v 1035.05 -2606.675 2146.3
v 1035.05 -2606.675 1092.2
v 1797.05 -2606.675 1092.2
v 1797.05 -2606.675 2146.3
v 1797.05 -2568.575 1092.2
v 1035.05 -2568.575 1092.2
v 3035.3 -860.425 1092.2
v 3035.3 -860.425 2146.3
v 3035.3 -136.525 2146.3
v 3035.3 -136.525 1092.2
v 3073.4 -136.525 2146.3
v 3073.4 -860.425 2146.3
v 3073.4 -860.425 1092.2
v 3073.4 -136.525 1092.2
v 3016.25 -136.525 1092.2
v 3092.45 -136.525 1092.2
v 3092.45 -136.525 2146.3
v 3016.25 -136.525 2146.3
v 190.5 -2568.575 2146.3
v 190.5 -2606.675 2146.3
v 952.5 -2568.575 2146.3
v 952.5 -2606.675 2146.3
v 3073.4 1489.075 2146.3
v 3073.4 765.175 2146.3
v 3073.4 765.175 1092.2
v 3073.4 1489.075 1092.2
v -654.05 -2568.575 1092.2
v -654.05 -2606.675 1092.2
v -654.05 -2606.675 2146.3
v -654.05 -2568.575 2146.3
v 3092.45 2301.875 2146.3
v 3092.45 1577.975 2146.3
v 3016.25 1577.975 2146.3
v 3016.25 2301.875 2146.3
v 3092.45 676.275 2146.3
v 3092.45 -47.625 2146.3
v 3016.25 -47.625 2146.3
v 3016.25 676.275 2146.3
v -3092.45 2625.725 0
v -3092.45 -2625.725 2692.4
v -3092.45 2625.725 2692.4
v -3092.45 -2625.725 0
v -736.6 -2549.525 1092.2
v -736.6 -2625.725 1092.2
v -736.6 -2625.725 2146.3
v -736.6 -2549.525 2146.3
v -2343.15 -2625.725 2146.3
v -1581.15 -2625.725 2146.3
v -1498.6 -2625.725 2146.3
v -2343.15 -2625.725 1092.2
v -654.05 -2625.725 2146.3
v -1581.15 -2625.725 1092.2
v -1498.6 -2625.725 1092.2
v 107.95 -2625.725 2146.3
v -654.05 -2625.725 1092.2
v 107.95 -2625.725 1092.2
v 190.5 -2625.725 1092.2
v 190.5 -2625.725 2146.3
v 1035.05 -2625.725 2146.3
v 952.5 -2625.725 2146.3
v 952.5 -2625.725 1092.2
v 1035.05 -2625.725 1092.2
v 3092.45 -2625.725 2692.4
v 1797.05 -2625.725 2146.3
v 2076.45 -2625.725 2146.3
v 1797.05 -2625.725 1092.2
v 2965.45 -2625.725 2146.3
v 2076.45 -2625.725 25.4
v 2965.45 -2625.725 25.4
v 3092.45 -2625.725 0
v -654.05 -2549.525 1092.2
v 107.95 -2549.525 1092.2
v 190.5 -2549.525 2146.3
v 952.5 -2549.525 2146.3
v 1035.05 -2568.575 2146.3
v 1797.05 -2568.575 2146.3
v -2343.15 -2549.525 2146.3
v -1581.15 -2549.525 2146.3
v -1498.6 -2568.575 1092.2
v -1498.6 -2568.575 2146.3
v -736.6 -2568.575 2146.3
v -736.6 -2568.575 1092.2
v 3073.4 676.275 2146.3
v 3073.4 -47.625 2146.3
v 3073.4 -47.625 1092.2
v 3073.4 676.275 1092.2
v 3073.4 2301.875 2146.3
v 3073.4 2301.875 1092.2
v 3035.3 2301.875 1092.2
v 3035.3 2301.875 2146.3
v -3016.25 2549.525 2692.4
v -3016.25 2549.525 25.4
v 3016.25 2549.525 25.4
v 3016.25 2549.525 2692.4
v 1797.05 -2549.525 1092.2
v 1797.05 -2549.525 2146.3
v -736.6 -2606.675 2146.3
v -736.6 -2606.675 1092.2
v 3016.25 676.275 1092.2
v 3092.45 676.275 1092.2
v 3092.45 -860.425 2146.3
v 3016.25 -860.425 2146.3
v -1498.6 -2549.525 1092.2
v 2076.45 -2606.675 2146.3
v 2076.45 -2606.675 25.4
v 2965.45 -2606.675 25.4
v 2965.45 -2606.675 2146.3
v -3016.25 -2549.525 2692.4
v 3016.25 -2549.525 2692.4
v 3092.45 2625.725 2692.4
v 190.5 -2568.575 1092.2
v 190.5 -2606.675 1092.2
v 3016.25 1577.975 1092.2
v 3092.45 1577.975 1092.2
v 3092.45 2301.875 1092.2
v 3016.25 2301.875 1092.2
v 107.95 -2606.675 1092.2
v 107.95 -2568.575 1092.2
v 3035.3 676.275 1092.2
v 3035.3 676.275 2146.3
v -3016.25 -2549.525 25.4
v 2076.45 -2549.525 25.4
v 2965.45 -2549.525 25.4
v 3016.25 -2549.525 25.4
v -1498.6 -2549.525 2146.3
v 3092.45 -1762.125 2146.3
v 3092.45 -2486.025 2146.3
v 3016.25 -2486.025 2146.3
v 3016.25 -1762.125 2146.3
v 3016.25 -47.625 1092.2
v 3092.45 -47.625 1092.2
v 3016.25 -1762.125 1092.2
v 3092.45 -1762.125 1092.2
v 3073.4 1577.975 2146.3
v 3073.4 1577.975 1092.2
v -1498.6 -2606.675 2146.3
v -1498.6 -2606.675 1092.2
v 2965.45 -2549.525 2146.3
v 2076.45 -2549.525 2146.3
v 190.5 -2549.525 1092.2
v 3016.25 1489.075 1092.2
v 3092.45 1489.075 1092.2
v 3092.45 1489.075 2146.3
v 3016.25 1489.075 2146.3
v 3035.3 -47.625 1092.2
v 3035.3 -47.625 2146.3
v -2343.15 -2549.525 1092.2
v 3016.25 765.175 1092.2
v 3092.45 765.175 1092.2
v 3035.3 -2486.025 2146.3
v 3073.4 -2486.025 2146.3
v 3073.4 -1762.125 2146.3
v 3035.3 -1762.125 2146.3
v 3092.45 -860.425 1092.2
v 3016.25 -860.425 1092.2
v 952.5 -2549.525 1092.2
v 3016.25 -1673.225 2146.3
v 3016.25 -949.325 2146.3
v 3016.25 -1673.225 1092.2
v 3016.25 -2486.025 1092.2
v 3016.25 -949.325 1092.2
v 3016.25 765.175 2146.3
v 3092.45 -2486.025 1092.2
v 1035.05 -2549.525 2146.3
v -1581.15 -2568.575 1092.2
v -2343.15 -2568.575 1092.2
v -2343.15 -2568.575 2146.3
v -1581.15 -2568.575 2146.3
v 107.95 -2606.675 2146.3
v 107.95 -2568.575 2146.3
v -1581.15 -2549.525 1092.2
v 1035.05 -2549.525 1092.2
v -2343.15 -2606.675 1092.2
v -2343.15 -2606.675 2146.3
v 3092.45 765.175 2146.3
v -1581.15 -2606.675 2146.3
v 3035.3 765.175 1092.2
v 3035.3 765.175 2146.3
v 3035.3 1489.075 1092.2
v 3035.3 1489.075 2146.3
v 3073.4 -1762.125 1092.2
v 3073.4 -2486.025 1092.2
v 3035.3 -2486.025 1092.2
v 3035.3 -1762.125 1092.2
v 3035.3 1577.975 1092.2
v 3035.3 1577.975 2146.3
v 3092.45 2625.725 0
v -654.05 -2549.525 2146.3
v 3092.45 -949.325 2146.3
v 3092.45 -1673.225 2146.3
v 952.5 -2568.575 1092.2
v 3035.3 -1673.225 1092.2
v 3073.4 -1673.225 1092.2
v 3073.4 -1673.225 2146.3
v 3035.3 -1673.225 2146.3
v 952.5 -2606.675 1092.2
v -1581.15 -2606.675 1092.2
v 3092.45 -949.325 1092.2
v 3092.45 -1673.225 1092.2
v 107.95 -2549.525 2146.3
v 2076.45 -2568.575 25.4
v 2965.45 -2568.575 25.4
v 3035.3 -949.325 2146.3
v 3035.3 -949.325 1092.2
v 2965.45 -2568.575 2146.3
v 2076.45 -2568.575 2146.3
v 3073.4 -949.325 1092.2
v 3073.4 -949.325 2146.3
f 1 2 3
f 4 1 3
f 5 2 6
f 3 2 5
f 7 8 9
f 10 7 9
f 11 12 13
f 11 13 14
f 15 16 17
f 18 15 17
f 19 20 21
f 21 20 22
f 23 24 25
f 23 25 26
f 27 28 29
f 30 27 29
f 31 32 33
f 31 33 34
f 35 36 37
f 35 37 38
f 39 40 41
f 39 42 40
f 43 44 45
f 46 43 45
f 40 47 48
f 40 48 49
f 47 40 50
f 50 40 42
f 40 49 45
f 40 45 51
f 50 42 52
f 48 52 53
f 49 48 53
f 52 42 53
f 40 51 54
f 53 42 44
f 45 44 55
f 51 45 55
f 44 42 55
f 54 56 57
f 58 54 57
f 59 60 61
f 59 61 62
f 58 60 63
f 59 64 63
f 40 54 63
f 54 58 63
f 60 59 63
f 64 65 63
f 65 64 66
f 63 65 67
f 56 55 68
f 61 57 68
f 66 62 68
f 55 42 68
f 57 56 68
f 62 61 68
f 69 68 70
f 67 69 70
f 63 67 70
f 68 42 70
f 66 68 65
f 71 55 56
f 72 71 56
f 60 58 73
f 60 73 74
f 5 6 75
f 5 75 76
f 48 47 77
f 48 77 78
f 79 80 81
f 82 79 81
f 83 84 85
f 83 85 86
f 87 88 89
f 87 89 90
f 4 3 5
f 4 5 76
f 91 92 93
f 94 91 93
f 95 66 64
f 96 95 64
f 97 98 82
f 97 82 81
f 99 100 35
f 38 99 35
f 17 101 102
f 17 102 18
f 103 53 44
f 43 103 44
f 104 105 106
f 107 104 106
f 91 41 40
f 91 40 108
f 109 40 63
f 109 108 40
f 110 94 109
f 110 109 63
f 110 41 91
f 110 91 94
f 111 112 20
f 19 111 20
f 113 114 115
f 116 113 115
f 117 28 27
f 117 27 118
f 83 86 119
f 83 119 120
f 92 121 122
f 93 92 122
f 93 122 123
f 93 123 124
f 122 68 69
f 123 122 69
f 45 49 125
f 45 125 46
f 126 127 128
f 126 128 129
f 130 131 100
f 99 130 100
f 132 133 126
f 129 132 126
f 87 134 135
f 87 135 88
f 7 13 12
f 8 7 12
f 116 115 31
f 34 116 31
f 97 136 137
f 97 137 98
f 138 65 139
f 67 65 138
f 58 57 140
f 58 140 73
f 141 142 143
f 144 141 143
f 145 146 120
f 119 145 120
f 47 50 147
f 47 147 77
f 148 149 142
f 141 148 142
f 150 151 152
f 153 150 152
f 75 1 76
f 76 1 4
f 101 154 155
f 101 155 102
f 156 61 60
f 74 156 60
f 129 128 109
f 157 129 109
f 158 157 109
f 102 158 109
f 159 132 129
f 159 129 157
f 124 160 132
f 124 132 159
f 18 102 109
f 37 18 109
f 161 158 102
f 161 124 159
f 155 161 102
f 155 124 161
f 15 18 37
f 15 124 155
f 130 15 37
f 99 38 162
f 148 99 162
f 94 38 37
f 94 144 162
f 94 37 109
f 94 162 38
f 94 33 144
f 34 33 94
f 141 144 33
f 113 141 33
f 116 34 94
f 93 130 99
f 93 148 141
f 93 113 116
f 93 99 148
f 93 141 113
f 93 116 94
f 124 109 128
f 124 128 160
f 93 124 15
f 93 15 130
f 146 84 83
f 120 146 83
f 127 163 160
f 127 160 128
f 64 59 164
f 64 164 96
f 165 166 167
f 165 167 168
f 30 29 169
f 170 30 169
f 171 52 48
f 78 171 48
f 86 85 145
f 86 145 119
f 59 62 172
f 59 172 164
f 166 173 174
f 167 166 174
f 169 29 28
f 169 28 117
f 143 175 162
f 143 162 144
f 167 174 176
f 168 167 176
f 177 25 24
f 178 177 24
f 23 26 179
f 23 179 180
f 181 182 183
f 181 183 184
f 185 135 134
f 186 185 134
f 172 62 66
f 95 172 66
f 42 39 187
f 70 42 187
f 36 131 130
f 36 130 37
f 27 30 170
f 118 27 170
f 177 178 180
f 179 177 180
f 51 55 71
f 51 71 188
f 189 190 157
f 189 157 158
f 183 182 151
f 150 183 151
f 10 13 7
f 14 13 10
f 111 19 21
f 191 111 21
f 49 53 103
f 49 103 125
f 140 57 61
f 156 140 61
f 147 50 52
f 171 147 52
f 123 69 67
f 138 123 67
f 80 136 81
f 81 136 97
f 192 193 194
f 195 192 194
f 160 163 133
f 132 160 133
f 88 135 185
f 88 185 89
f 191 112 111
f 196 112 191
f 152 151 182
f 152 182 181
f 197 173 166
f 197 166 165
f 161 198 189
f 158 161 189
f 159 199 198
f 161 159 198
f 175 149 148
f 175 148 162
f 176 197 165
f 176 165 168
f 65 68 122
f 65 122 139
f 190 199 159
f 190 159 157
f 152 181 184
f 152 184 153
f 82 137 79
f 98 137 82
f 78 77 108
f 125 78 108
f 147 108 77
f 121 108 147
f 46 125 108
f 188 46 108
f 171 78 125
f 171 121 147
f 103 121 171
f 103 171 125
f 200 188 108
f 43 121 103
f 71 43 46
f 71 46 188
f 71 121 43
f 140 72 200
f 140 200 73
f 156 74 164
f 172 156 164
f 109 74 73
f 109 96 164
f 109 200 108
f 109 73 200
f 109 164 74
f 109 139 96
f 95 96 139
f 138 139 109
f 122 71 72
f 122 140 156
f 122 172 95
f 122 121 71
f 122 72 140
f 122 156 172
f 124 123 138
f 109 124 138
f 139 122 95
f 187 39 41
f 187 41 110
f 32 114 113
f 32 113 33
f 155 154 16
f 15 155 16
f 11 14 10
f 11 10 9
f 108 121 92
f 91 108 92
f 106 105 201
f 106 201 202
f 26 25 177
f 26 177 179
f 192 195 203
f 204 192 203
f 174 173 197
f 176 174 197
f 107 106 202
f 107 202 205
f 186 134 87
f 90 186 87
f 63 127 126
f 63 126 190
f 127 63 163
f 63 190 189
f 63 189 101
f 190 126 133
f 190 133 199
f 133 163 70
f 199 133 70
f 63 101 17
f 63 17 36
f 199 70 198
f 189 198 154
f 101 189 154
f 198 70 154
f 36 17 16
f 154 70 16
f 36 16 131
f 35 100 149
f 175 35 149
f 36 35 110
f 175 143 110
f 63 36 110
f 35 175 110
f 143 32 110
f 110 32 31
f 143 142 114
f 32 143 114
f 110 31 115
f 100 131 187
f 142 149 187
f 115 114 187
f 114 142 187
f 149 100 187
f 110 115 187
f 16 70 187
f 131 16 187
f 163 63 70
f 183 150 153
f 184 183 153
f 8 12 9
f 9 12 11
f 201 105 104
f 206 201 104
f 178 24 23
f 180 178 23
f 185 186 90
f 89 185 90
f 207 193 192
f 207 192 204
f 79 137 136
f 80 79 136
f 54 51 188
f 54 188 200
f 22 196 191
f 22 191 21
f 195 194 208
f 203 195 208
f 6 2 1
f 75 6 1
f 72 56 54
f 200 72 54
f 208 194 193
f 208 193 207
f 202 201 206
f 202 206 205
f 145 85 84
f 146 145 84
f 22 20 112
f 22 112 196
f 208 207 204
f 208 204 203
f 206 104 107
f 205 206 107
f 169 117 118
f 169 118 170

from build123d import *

# Parameters (mm, degrees)
F0_W      = 6184.9
F0_H      = 5251.45
F1_DEPTH  = 25.4
F2_W      = 6184.9
F2_H      = 5251.45
F2_W_2    = 6032.5
F2_H_2    = 5099.05
F3_DEPTH  = 2667
F4_W      = 889
F4_H      = 2120.9
F5_DEPTH  = 76.2
F6_W      = 723.9
F6_H      = 1054.1
F7_DEPTH  = 76.2
F8_W      = 762
F8_H      = 1054.1
F9_DEPTH  = 76.2
F10_START = -19.05
F10_DEPTH = 38.1
F11_START = -19.05
F11_DEPTH = 38.1
F12_START = -19.05
F12_DEPTH = 38.1


with BuildPart() as f1:
    # F0 (on Top) → F1 (new body)
    with BuildSketch(Plane.XY):
        Rectangle(F0_W, F0_H)
    extrude(amount=F1_DEPTH)

    # F2 (on face) → F3 (join)
    with BuildSketch(Plane.XY.offset(25.4)):
        Rectangle(F2_W, F2_H)
        Rectangle(F2_W_2, F2_H_2, mode=Mode.SUBTRACT)
    extrude(amount=F3_DEPTH)

    # F4 (on face) → F5 (cut)
    with BuildSketch(Plane.XZ.offset(2625.725)):
        with Locations((2520.95, 1085.85)):
            Rectangle(F4_W, F4_H)
    extrude(amount=-F5_DEPTH, mode=Mode.SUBTRACT)

    # F6 (on face) → F7 (cut)
    with BuildSketch(Plane.YZ.offset(3092.45)):
        with Locations((-2124.075, 1619.25)):
            Rectangle(F6_W, F6_H)
        with Locations((-1311.275, 1619.25)):
            Rectangle(F6_W, F6_H)
        with Locations((-498.475, 1619.25)):
            Rectangle(F6_W, F6_H)
        with Locations((314.325, 1619.25)):
            Rectangle(F6_W, F6_H)
        with Locations((1127.125, 1619.25)):
            Rectangle(F6_W, F6_H)
        with Locations((1939.925, 1619.25)):
            Rectangle(F6_W, F6_H)
    extrude(amount=-F7_DEPTH, mode=Mode.SUBTRACT)

    # F8 (on face) → F9 (cut)
    with BuildSketch(Plane.XZ.offset(2625.725)):
        with Locations((-1962.15, 1619.25)):
            Rectangle(F8_W, F8_H)
        with Locations((-1117.6, 1619.25)):
            Rectangle(F8_W, F8_H)
        with Locations((-273.05, 1619.25)):
            Rectangle(F8_W, F8_H)
        with Locations((571.5, 1619.25)):
            Rectangle(F8_W, F8_H)
        with Locations((1416.05, 1619.25)):
            Rectangle(F8_W, F8_H)
    extrude(amount=-F9_DEPTH, mode=Mode.SUBTRACT)


with BuildPart() as f10:
    # F4 (on face) → F10 (new body)
    with BuildSketch(Plane.XZ.offset(2625.725).offset(F10_START)):
        with Locations((2520.95, 1085.85)):
            Rectangle(F4_W, F4_H)
    extrude(amount=-F10_DEPTH)


with BuildPart() as f11:
    # F6 (on face) → F11 (new body)
    with BuildSketch(Plane.YZ.offset(3092.45).offset(F11_START)):
        with Locations((-2124.075, 1619.25)):
            Rectangle(F6_W, F6_H)
    extrude(amount=-F11_DEPTH)


with BuildPart() as f11b:
    # F6 (on face) → F11, piece 2 (new body)
    with BuildSketch(Plane.YZ.offset(3092.45).offset(F11_START)):
        with Locations((-1311.275, 1619.25)):
            Rectangle(F6_W, F6_H)
    extrude(amount=-F11_DEPTH)


with BuildPart() as f11c:
    # F6 (on face) → F11, piece 3 (new body)
    with BuildSketch(Plane.YZ.offset(3092.45).offset(F11_START)):
        with Locations((-498.475, 1619.25)):
            Rectangle(F6_W, F6_H)
    extrude(amount=-F11_DEPTH)


with BuildPart() as f11d:
    # F6 (on face) → F11, piece 4 (new body)
    with BuildSketch(Plane.YZ.offset(3092.45).offset(F11_START)):
        with Locations((314.325, 1619.25)):
            Rectangle(F6_W, F6_H)
    extrude(amount=-F11_DEPTH)


with BuildPart() as f11e:
    # F6 (on face) → F11, piece 5 (new body)
    with BuildSketch(Plane.YZ.offset(3092.45).offset(F11_START)):
        with Locations((1127.125, 1619.25)):
            Rectangle(F6_W, F6_H)
    extrude(amount=-F11_DEPTH)


with BuildPart() as f11f:
    # F6 (on face) → F11, piece 6 (new body)
    with BuildSketch(Plane.YZ.offset(3092.45).offset(F11_START)):
        with Locations((1939.925, 1619.25)):
            Rectangle(F6_W, F6_H)
    extrude(amount=-F11_DEPTH)


with BuildPart() as f12:
    # F8 (on face) → F12 (new body)
    with BuildSketch(Plane.XZ.offset(2625.725).offset(F12_START)):
        with Locations((-1962.15, 1619.25)):
            Rectangle(F8_W, F8_H)
    extrude(amount=-F12_DEPTH)


with BuildPart() as f12b:
    # F8 (on face) → F12, piece 2 (new body)
    with BuildSketch(Plane.XZ.offset(2625.725).offset(F12_START)):
        with Locations((-1117.6, 1619.25)):
            Rectangle(F8_W, F8_H)
    extrude(amount=-F12_DEPTH)


with BuildPart() as f12c:
    # F8 (on face) → F12, piece 3 (new body)
    with BuildSketch(Plane.XZ.offset(2625.725).offset(F12_START)):
        with Locations((-273.05, 1619.25)):
            Rectangle(F8_W, F8_H)
    extrude(amount=-F12_DEPTH)


with BuildPart() as f12d:
    # F8 (on face) → F12, piece 4 (new body)
    with BuildSketch(Plane.XZ.offset(2625.725).offset(F12_START)):
        with Locations((571.5, 1619.25)):
            Rectangle(F8_W, F8_H)
    extrude(amount=-F12_DEPTH)


with BuildPart() as f12e:
    # F8 (on face) → F12, piece 5 (new body)
    with BuildSketch(Plane.XZ.offset(2625.725).offset(F12_START)):
        with Locations((1416.05, 1619.25)):
            Rectangle(F8_W, F8_H)
    extrude(amount=-F12_DEPTH)


solid = Compound([f1.part, f10.part, f11.part, f11b.part, f11c.part, f11d.part, f11e.part, f11f.part, f12.part, f12b.part, f12c.part, f12d.part, f12e.part])
